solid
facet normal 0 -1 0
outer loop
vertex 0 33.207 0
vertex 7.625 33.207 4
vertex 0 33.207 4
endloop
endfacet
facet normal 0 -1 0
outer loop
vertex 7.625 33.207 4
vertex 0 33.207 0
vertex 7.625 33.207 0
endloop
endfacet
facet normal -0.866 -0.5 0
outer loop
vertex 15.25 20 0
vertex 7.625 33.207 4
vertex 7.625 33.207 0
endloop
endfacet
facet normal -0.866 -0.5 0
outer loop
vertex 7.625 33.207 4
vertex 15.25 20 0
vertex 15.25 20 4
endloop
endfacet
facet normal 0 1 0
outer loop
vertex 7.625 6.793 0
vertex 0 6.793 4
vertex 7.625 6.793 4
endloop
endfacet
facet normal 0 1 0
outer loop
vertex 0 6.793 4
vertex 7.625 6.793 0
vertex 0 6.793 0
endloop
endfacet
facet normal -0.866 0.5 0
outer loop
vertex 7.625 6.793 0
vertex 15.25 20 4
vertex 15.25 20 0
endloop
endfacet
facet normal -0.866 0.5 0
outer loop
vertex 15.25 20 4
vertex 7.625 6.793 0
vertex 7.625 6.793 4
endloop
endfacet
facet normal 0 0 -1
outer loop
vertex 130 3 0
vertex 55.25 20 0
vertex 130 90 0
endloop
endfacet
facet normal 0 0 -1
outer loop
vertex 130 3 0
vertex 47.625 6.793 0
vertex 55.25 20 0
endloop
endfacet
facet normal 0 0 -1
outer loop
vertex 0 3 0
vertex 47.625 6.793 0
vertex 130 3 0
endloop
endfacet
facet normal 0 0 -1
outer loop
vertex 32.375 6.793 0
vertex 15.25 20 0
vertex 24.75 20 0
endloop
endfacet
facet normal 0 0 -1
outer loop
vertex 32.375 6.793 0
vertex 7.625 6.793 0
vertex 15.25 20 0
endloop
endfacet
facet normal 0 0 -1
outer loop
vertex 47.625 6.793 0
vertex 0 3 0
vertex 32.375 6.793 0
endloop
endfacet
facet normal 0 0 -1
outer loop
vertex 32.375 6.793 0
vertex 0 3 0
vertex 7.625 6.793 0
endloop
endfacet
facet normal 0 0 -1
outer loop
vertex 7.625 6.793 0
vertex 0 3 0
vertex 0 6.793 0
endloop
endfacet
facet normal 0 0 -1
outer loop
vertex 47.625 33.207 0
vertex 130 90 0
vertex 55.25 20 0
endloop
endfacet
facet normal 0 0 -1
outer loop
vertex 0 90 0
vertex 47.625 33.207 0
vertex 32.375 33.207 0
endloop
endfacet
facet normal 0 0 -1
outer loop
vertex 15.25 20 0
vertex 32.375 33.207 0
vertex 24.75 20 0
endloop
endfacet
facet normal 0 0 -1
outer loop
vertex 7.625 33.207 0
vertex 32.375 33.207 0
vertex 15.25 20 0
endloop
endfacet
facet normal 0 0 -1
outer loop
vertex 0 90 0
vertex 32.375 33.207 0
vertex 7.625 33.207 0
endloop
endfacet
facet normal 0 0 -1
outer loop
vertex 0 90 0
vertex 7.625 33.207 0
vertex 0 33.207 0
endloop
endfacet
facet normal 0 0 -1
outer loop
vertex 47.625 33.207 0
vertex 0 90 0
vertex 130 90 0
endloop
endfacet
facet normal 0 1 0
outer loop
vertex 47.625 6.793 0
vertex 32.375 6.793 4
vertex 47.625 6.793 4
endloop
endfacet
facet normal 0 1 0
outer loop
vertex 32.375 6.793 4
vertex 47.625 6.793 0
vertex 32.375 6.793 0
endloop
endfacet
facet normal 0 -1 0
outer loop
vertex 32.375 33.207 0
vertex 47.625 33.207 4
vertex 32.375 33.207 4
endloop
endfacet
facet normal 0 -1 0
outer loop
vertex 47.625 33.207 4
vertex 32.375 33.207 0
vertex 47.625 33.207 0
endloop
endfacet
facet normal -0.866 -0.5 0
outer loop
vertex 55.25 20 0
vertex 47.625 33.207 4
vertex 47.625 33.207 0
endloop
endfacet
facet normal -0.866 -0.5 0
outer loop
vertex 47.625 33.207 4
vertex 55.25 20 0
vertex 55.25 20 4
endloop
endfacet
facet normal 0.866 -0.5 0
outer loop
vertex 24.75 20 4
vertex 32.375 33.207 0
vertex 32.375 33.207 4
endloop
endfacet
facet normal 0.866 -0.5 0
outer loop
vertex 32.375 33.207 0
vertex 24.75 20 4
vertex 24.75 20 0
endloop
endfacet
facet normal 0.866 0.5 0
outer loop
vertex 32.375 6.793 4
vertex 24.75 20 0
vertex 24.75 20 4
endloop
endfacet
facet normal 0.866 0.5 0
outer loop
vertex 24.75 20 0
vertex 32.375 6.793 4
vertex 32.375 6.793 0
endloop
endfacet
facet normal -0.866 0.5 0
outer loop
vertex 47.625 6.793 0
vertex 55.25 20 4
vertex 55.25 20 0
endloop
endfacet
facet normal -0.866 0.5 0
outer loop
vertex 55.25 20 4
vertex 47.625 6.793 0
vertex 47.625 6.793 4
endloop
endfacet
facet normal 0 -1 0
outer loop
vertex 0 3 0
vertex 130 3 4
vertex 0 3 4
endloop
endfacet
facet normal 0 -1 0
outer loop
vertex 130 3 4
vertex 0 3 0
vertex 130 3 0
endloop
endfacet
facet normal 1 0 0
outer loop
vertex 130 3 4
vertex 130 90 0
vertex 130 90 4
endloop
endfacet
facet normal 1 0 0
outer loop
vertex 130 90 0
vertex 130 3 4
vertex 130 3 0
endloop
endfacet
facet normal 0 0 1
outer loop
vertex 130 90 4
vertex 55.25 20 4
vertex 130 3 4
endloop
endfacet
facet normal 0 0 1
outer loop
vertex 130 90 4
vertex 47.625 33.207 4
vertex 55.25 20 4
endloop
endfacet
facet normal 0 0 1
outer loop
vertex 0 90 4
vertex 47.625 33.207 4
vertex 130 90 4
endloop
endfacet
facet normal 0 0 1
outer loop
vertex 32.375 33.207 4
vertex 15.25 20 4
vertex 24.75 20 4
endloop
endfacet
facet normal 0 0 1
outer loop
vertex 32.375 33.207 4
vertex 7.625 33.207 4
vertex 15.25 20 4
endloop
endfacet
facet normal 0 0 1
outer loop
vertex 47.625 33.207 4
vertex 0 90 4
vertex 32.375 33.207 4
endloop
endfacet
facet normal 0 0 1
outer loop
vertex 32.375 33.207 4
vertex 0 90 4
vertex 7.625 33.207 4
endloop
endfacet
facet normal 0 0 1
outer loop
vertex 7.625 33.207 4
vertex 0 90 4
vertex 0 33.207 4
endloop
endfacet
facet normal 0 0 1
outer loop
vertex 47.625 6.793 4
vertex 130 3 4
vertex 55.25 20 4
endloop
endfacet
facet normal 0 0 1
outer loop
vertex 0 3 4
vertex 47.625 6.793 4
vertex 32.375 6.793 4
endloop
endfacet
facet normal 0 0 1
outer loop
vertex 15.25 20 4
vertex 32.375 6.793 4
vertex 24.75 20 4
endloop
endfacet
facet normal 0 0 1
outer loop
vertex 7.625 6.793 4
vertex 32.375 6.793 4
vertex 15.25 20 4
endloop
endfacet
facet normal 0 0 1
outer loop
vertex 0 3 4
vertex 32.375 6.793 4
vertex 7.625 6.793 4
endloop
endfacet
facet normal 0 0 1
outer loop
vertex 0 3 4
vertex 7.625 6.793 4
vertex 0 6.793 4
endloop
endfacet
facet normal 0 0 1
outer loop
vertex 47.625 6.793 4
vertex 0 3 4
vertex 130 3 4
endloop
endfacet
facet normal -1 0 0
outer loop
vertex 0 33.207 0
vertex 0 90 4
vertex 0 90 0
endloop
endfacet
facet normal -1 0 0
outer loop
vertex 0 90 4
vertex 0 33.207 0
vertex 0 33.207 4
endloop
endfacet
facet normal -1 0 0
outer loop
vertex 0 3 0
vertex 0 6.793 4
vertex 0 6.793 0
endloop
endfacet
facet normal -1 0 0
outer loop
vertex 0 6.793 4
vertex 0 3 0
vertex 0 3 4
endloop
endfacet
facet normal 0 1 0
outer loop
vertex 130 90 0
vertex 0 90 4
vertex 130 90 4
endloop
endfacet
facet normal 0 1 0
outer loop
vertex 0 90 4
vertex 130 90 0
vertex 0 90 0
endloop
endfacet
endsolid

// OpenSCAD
// Tube rack - a flat plate with a regular grid of tube holes and two solid wall guides along the
// long edges. NOVEL general part (a generic hole grid, not any one labware item). Teaches a regular
// (grid) hole pattern, a wall built up from a base plate, and a part that is intentionally
// upside-down for the print: it rests on the bed then is flipped over so the walls stand on the
// surface it was printed against.
//

cols   = 3;
rows   = 2;
tube_d = 30.5;
pitch  = 40;
plate_l = 130;
plate_w = 90;
base_t = 4;
wall_h = 70;

$fn = 6;

col_pitch = pitch;
row_pitch = pitch;

difference() {
    cube([plate_l, plate_w, base_t]);
    for (x = [-(cols - 1) * col_pitch / 2 : col_pitch : (cols - 1) * col_pitch / 2],
        y = [-(rows - 1) * row_pitch / 2 : row_pitch : (rows - 1) * row_pitch / 2]) {
        translate([x, y, 0]) cylinder(h = base_t + 1, d = tube_d);     // through-holes
    }
    // two solid walls along the long edges (X = +/- L/2), e.g. for the tubes to lean against
    for (x = [-plate_l / 2, plate_l / 2]) {
        translate([x, -1, 0]) cube([plate_l, 4, wall_h]);
    }
}
